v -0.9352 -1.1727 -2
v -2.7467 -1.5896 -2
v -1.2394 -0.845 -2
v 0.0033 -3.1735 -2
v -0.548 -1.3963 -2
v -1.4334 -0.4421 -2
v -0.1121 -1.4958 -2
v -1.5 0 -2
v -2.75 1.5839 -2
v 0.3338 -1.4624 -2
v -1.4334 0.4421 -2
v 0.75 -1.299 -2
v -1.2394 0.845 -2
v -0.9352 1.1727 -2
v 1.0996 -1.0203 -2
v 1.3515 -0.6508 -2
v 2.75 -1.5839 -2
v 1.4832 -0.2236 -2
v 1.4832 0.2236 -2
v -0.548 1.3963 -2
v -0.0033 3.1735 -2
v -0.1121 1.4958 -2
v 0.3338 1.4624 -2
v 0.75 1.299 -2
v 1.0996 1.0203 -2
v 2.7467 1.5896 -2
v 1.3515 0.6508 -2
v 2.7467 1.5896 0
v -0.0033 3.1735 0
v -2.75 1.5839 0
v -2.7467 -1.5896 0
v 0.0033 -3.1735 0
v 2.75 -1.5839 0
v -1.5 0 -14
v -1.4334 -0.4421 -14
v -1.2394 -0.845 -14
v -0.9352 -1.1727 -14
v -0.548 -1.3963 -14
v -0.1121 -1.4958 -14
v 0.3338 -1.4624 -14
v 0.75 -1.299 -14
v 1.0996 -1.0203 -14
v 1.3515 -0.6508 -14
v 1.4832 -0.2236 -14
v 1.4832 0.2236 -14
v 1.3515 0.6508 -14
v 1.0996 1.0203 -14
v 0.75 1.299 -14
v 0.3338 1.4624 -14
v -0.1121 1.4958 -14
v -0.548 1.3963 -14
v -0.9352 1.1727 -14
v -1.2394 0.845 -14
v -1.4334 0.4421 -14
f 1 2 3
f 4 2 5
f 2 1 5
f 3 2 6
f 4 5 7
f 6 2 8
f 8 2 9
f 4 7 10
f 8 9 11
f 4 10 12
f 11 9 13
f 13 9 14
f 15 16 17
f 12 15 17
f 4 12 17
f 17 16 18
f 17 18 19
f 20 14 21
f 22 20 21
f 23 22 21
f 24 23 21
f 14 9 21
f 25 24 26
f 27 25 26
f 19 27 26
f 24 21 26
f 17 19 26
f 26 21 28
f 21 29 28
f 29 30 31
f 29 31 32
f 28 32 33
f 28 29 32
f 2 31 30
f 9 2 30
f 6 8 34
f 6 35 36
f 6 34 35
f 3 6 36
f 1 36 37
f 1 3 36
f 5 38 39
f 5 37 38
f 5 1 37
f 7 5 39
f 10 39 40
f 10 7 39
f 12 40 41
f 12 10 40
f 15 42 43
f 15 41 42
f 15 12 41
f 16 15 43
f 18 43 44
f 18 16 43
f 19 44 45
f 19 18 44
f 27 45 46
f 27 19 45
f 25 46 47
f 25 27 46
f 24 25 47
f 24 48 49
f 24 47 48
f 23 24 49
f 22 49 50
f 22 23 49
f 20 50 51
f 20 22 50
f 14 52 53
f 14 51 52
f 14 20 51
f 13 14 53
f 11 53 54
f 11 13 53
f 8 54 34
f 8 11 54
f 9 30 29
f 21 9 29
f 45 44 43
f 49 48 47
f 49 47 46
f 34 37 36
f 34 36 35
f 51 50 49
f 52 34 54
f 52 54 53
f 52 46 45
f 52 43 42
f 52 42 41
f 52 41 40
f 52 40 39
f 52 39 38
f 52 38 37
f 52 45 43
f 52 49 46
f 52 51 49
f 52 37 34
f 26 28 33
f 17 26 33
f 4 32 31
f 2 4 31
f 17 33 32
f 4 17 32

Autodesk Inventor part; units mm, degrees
ref_plane "YZ Plane" through (0, 0, 0) normal (1, 0, 0) x (0, 1, 0)
ref_plane "XZ Plane" through (0, 0, 0) normal (0, 1, 0) x (-1, 0, 0)
ref_plane "XY Plane" through (0, 0, 0) normal (0, 0, 1) x (1, 0, 0)
sketch "Boceto1" plane through (0, 0, 0) normal (0, 0, 1) x (1, 0, 0)
  line L0 (-2.75, 1.5839) -> (-0.0033, 3.1735)
  line L1 (-0.0033, 3.1735) -> (2.7467, 1.5896)
  line L2 (2.7467, 1.5896) -> (2.75, -1.5839)
  line L3 (2.75, -1.5839) -> (0.0033, -3.1735)
  line L4 (0.0033, -3.1735) -> (-2.7467, -1.5896)
  line L5 (-2.7467, -1.5896) -> (-2.75, 1.5839)
  point P0 (0, 0)
  point P1 (0, 0)
extrude "Extrusión1" add sketch "Boceto1" against normal blind 2
sketch "Boceto2" plane through (0, 0, -2) normal (0, 0, -1) x (-1, 0, 0)
  circle A0 centre (0, 0) radius 1.5
  dimension "d3" = 3
extrude "Extrusión2" add sketch "Boceto2" along normal blind 12
properties part number "Tornillo para Bracket"
